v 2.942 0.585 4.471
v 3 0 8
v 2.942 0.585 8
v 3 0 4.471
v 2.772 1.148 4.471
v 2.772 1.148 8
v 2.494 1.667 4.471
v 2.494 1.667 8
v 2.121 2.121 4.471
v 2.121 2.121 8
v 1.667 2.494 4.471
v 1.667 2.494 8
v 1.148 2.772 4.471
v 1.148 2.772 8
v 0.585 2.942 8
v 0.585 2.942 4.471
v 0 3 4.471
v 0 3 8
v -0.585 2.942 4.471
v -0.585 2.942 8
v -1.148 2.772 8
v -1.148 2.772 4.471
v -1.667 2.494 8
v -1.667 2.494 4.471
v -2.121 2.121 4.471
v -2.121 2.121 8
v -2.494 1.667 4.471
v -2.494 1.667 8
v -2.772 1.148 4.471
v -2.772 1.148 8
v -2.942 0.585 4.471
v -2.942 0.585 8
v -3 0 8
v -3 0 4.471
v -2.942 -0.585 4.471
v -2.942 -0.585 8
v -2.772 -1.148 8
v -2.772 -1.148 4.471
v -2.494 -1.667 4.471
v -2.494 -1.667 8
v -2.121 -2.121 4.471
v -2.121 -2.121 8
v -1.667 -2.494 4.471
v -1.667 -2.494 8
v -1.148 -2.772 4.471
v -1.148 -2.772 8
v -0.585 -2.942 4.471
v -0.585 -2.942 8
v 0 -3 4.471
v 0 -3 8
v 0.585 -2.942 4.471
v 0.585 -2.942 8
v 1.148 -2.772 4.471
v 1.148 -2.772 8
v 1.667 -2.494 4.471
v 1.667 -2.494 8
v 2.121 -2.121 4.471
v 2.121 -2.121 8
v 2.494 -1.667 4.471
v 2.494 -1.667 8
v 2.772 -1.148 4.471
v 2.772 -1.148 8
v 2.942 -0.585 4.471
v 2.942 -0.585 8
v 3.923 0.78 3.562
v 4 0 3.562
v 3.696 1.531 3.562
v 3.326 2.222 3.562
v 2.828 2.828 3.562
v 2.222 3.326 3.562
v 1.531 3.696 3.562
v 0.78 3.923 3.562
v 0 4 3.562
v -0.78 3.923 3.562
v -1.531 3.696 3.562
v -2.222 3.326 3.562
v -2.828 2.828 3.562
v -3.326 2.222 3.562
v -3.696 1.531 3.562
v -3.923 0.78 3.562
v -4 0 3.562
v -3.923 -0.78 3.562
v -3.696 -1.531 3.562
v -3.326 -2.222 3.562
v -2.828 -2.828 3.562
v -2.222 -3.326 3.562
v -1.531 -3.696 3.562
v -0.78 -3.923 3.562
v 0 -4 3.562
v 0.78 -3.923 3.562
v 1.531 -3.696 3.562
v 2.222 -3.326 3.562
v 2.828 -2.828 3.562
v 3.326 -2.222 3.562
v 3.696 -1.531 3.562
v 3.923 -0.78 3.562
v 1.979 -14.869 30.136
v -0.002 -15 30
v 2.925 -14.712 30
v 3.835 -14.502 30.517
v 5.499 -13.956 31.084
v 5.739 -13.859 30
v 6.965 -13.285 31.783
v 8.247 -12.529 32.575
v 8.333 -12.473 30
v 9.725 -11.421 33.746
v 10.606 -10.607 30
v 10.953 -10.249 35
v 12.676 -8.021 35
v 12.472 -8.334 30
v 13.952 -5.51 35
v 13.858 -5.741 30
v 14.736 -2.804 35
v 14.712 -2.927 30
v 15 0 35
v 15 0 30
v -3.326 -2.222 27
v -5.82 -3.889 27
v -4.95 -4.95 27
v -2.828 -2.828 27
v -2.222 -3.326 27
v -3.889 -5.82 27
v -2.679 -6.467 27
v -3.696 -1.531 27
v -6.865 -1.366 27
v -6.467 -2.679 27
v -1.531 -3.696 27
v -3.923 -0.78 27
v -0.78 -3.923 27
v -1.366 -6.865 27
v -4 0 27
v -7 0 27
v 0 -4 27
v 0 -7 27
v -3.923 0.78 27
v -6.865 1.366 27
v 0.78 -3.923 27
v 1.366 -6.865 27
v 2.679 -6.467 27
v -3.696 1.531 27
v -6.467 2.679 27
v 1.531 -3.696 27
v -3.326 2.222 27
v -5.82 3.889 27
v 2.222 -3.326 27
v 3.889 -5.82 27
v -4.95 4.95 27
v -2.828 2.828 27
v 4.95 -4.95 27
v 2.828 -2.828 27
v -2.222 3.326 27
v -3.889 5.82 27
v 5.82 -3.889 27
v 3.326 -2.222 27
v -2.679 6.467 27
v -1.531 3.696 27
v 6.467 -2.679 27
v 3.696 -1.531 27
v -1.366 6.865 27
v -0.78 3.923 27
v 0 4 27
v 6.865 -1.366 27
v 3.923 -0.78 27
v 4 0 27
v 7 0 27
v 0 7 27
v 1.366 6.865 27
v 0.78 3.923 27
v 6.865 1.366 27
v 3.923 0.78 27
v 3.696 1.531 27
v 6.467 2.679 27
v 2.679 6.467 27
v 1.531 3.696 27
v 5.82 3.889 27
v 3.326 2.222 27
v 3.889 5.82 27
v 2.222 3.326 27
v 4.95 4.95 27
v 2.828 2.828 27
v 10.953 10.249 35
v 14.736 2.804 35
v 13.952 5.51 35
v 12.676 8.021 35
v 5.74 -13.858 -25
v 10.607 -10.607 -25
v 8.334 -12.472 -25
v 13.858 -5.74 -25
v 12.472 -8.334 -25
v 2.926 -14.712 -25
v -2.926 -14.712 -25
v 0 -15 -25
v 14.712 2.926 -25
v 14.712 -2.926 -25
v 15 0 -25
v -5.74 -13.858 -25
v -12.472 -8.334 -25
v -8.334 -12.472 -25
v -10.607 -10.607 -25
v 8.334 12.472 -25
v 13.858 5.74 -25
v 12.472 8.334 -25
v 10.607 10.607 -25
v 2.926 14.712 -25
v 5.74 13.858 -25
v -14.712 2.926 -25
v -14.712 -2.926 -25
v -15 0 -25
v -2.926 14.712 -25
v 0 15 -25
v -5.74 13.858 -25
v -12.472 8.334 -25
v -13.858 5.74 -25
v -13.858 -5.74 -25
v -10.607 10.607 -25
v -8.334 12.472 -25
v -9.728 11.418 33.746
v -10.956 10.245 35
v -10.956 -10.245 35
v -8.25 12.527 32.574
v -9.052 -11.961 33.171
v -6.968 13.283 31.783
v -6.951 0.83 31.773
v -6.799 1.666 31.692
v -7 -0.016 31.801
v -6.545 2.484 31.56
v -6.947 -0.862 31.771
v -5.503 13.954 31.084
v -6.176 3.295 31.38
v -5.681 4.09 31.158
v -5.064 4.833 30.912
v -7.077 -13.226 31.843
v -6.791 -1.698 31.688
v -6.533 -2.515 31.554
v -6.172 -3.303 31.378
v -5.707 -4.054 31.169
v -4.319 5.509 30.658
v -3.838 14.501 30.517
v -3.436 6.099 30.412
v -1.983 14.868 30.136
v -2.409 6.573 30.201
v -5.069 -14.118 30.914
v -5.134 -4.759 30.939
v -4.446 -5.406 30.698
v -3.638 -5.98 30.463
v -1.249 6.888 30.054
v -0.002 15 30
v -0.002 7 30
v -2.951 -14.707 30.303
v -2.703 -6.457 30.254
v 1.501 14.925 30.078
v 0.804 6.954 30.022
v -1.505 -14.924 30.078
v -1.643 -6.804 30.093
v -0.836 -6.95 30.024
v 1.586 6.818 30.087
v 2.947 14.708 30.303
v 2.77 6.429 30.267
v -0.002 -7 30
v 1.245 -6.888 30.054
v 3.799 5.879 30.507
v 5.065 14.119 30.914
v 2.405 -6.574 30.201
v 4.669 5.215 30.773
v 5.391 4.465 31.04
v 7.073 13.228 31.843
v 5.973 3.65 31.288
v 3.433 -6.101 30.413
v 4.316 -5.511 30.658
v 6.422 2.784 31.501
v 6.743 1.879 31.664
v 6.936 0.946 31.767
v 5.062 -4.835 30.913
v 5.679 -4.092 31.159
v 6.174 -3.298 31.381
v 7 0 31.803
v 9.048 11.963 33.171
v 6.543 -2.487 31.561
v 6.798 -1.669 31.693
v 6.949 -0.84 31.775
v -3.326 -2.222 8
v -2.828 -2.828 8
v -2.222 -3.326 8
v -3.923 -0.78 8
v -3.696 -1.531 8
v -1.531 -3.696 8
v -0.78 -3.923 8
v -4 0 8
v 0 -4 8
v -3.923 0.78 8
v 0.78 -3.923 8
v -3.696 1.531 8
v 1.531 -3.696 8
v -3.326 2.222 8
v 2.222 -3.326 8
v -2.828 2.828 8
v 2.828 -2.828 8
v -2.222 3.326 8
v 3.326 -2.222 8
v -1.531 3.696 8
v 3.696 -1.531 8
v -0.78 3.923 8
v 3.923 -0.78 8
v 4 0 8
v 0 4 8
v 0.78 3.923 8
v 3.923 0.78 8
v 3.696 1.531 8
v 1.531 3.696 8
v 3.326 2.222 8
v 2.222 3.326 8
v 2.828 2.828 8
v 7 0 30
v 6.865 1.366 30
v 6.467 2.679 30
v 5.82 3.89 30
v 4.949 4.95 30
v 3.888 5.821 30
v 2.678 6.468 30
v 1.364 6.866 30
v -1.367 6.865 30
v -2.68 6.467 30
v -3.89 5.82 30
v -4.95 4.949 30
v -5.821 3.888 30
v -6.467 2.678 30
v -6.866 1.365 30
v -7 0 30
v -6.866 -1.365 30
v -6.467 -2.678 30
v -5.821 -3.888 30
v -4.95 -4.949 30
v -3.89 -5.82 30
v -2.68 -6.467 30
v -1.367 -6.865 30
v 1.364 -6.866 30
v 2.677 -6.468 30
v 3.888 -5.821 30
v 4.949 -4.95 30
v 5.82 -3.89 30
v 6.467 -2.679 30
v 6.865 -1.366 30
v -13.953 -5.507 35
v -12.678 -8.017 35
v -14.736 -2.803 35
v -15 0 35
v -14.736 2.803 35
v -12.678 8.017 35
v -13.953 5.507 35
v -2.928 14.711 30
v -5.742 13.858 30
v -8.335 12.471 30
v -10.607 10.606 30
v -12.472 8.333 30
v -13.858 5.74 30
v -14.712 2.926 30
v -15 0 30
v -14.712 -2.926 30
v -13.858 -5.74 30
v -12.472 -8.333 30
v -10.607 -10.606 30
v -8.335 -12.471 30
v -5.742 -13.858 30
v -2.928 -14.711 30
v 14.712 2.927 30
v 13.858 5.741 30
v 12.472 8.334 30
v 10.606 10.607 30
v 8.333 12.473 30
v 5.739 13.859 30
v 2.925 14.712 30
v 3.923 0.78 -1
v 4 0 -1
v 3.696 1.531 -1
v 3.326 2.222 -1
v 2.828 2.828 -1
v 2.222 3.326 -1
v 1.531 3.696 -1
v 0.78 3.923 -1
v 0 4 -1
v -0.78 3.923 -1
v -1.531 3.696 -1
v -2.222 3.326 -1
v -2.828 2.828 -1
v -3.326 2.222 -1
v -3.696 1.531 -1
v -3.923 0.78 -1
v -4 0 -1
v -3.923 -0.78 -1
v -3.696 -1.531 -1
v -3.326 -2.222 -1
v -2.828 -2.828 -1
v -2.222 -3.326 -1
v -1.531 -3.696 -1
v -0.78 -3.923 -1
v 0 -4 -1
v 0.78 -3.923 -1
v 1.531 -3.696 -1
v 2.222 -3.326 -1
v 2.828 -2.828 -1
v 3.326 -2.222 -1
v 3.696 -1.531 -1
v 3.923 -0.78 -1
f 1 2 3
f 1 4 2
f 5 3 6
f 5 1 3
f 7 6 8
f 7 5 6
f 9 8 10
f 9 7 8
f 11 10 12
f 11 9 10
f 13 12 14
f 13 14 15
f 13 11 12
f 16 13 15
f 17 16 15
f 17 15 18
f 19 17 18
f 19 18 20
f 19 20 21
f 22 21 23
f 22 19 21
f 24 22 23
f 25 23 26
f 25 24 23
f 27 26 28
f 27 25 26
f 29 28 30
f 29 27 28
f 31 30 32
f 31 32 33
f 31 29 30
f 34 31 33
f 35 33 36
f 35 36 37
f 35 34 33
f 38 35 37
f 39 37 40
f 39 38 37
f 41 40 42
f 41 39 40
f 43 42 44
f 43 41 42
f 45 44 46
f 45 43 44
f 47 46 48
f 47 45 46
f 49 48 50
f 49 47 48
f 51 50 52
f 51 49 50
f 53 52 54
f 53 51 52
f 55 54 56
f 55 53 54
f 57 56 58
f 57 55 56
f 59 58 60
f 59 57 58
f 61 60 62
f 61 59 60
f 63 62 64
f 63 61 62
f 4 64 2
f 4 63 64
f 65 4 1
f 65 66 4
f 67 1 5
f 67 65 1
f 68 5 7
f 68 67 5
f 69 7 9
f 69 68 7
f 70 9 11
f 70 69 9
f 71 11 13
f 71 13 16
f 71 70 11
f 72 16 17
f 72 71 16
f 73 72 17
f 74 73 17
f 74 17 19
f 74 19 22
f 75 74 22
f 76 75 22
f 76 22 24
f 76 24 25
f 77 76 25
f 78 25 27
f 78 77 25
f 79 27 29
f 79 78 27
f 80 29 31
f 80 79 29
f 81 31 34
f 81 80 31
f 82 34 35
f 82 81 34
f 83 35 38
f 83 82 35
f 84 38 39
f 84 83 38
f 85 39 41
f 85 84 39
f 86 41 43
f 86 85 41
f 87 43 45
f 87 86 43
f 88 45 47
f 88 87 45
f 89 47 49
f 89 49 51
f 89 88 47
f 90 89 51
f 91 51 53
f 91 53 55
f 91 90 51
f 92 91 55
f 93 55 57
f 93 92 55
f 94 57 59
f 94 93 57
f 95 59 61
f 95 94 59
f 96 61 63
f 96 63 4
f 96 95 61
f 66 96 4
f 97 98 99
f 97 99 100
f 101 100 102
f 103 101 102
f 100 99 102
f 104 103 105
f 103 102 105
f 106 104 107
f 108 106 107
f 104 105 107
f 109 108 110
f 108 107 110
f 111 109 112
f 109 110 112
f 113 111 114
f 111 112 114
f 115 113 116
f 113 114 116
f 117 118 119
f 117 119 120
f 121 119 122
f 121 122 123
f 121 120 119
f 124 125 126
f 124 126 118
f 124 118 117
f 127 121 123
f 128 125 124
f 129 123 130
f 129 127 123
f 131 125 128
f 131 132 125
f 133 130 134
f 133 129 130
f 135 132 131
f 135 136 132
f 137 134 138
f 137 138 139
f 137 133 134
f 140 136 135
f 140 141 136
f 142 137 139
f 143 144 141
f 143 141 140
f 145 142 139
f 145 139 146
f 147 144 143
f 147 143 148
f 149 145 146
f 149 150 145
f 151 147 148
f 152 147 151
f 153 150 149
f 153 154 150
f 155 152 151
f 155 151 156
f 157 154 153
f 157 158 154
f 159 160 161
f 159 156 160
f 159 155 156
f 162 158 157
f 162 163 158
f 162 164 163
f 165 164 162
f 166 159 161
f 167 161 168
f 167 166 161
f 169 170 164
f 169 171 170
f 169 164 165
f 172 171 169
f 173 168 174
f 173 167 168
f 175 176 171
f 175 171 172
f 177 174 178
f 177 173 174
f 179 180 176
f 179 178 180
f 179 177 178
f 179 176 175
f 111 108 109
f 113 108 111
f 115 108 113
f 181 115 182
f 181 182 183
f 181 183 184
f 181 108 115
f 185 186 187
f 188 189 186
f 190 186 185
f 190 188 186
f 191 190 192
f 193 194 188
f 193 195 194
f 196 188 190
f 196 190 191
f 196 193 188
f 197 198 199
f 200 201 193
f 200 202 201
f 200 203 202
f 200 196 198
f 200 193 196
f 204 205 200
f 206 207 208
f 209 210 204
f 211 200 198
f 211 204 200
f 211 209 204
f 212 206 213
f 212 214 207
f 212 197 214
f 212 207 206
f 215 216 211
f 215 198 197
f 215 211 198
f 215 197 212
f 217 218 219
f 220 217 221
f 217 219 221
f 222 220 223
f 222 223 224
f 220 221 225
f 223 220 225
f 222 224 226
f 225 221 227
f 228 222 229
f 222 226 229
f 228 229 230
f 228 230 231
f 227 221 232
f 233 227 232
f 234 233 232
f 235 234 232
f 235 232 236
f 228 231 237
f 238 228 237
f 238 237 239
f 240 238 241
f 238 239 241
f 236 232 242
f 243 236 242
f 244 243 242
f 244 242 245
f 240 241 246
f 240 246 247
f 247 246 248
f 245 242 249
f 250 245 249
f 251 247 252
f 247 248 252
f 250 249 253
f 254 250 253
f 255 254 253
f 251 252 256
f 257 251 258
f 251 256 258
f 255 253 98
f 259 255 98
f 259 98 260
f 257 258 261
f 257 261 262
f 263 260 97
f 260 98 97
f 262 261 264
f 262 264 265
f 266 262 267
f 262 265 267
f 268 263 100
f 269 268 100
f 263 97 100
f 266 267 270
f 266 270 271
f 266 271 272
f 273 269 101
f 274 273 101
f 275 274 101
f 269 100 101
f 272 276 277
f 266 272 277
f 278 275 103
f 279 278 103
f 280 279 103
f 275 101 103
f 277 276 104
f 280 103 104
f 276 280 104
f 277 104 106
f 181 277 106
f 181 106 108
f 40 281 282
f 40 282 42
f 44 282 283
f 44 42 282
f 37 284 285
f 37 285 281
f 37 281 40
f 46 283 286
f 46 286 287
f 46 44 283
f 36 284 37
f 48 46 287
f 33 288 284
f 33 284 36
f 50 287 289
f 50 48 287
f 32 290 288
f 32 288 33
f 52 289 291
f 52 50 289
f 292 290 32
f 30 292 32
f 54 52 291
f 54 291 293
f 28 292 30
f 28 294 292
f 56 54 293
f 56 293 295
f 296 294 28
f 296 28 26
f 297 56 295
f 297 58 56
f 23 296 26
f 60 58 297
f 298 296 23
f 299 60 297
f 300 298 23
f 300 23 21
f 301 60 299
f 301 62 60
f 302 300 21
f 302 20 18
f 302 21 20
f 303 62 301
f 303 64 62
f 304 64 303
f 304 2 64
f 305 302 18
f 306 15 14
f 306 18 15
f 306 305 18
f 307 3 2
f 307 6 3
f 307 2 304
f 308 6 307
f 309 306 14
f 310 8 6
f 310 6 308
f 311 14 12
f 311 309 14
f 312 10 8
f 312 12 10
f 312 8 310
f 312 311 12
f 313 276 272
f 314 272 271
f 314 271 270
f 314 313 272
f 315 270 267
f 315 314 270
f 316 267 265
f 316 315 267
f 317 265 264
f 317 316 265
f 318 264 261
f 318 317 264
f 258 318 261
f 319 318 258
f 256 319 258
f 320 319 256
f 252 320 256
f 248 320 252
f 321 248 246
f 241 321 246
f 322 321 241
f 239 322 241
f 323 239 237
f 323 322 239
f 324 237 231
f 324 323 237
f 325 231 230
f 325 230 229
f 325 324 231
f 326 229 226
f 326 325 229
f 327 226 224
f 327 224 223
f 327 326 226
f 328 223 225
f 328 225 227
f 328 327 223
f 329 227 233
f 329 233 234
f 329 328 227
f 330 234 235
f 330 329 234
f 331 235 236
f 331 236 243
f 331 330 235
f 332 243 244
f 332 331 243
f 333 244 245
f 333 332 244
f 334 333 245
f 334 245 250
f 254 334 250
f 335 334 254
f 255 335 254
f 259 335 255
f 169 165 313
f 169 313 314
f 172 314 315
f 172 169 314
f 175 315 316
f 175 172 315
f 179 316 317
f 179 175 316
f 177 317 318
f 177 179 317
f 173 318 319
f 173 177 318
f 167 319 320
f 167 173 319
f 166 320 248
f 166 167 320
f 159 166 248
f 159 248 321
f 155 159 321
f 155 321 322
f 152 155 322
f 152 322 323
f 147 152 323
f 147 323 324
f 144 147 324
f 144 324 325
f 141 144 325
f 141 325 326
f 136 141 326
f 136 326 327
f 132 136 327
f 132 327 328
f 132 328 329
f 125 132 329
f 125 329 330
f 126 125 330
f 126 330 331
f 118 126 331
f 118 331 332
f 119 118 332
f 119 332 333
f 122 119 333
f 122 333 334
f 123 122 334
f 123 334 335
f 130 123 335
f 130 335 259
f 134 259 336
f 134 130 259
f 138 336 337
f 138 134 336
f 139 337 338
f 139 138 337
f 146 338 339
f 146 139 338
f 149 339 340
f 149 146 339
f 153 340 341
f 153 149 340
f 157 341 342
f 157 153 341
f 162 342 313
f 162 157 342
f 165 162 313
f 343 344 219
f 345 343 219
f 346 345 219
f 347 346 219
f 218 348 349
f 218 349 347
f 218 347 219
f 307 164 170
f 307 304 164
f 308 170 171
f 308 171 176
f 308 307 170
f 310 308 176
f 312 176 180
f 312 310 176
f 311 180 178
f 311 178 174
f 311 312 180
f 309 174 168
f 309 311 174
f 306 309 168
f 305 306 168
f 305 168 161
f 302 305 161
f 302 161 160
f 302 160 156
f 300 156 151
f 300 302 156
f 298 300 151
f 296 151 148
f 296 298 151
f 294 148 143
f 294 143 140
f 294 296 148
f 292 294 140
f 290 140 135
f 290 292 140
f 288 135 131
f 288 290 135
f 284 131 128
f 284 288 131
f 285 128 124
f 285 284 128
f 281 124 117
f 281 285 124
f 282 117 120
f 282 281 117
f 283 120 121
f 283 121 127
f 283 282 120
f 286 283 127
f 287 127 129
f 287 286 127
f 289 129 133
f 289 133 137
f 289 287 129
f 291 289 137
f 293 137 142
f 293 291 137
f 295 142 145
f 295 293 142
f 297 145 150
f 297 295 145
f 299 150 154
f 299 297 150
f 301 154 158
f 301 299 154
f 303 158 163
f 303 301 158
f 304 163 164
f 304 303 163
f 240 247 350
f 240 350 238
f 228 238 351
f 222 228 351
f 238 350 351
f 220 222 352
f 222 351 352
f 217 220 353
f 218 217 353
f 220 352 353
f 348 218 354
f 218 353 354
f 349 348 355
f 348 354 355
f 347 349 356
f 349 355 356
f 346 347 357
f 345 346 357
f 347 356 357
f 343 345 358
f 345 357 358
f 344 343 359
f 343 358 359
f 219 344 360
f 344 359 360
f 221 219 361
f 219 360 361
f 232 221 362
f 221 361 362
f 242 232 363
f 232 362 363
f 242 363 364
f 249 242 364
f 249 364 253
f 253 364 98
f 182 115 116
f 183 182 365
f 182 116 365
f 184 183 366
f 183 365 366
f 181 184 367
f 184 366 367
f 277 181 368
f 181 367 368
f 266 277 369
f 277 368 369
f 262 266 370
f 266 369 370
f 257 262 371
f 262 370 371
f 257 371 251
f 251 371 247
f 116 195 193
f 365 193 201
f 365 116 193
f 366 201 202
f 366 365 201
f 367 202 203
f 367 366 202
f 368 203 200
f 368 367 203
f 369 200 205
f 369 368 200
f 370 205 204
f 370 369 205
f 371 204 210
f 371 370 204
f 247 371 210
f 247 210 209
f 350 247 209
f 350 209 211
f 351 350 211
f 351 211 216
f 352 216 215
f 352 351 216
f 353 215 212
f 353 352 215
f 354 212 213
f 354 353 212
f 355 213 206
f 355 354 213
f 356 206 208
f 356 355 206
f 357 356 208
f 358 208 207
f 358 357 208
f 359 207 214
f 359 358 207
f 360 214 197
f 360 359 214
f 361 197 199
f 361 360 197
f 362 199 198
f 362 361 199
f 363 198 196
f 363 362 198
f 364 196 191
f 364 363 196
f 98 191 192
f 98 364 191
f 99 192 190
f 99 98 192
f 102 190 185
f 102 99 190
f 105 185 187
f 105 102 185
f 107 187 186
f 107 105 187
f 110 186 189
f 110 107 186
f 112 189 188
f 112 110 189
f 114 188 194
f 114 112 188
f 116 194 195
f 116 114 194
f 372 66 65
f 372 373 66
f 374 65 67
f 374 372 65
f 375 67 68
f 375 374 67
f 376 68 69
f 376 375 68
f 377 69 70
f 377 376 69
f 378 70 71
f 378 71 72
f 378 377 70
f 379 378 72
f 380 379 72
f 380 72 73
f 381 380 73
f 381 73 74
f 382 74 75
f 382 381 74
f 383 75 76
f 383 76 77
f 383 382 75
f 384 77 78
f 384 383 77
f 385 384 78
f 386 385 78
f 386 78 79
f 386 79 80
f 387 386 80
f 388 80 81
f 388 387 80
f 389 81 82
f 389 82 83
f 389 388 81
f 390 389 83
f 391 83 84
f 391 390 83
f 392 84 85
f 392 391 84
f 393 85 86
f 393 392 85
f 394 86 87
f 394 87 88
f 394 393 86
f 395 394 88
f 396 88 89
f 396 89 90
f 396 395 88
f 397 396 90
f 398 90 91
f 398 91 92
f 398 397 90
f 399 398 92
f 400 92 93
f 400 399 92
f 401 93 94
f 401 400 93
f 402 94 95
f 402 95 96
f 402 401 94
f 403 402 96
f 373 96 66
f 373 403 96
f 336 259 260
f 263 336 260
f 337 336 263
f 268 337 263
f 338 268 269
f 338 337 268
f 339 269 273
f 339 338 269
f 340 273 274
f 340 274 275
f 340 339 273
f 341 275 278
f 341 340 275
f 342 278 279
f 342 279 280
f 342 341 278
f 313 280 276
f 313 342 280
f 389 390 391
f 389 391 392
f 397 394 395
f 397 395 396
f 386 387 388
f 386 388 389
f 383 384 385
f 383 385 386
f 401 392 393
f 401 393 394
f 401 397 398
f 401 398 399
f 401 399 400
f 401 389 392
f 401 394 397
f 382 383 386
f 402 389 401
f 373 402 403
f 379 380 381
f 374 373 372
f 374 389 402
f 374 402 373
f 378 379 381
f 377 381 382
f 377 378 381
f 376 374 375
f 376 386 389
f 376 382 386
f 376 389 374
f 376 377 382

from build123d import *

# Parameters (mm, degrees)
F1_FACE_R   = 15
F1_FACE_R_2 = 7
F2_DEPTH    = 5
F4_DEPTH    = 20


with BuildPart() as f1:
    # F0 (on Front) → F1 (revolve)
    with BuildSketch(Plane.XZ):
        Polygon((7, 27), (4, 27), (4, 8), (3, 8), (3, 4.470672), (4, 3.561659), (4, 0), (4, -1), (0, -1), (0, -25), (15, -25), (15, 27), (15, 30), (7, 30), align=None)
    revolve(axis=Axis((0, 0, -12.5), (0, 0, 1)))

    # F1_face (on face) → F2 (join)
    with BuildSketch(Plane.XY.offset(30)):
        Circle(F1_FACE_R)
        Circle(F1_FACE_R_2, mode=Mode.SUBTRACT)
    extrude(amount=F2_DEPTH)

    # F3 (on Front) → F4 (cut, symmetric)
    with BuildSketch(Plane.XZ):
        with BuildLine():
            Line((10.994077, 35.048041), (-10.997782, 35.048041))
            ThreePointArc((-10.997782, 35.048041), (-0.001852, 30), (10.994077, 35.048041))
        make_face()
    extrude(amount=F4_DEPTH, both=True, mode=Mode.SUBTRACT)


solid = f1.part
